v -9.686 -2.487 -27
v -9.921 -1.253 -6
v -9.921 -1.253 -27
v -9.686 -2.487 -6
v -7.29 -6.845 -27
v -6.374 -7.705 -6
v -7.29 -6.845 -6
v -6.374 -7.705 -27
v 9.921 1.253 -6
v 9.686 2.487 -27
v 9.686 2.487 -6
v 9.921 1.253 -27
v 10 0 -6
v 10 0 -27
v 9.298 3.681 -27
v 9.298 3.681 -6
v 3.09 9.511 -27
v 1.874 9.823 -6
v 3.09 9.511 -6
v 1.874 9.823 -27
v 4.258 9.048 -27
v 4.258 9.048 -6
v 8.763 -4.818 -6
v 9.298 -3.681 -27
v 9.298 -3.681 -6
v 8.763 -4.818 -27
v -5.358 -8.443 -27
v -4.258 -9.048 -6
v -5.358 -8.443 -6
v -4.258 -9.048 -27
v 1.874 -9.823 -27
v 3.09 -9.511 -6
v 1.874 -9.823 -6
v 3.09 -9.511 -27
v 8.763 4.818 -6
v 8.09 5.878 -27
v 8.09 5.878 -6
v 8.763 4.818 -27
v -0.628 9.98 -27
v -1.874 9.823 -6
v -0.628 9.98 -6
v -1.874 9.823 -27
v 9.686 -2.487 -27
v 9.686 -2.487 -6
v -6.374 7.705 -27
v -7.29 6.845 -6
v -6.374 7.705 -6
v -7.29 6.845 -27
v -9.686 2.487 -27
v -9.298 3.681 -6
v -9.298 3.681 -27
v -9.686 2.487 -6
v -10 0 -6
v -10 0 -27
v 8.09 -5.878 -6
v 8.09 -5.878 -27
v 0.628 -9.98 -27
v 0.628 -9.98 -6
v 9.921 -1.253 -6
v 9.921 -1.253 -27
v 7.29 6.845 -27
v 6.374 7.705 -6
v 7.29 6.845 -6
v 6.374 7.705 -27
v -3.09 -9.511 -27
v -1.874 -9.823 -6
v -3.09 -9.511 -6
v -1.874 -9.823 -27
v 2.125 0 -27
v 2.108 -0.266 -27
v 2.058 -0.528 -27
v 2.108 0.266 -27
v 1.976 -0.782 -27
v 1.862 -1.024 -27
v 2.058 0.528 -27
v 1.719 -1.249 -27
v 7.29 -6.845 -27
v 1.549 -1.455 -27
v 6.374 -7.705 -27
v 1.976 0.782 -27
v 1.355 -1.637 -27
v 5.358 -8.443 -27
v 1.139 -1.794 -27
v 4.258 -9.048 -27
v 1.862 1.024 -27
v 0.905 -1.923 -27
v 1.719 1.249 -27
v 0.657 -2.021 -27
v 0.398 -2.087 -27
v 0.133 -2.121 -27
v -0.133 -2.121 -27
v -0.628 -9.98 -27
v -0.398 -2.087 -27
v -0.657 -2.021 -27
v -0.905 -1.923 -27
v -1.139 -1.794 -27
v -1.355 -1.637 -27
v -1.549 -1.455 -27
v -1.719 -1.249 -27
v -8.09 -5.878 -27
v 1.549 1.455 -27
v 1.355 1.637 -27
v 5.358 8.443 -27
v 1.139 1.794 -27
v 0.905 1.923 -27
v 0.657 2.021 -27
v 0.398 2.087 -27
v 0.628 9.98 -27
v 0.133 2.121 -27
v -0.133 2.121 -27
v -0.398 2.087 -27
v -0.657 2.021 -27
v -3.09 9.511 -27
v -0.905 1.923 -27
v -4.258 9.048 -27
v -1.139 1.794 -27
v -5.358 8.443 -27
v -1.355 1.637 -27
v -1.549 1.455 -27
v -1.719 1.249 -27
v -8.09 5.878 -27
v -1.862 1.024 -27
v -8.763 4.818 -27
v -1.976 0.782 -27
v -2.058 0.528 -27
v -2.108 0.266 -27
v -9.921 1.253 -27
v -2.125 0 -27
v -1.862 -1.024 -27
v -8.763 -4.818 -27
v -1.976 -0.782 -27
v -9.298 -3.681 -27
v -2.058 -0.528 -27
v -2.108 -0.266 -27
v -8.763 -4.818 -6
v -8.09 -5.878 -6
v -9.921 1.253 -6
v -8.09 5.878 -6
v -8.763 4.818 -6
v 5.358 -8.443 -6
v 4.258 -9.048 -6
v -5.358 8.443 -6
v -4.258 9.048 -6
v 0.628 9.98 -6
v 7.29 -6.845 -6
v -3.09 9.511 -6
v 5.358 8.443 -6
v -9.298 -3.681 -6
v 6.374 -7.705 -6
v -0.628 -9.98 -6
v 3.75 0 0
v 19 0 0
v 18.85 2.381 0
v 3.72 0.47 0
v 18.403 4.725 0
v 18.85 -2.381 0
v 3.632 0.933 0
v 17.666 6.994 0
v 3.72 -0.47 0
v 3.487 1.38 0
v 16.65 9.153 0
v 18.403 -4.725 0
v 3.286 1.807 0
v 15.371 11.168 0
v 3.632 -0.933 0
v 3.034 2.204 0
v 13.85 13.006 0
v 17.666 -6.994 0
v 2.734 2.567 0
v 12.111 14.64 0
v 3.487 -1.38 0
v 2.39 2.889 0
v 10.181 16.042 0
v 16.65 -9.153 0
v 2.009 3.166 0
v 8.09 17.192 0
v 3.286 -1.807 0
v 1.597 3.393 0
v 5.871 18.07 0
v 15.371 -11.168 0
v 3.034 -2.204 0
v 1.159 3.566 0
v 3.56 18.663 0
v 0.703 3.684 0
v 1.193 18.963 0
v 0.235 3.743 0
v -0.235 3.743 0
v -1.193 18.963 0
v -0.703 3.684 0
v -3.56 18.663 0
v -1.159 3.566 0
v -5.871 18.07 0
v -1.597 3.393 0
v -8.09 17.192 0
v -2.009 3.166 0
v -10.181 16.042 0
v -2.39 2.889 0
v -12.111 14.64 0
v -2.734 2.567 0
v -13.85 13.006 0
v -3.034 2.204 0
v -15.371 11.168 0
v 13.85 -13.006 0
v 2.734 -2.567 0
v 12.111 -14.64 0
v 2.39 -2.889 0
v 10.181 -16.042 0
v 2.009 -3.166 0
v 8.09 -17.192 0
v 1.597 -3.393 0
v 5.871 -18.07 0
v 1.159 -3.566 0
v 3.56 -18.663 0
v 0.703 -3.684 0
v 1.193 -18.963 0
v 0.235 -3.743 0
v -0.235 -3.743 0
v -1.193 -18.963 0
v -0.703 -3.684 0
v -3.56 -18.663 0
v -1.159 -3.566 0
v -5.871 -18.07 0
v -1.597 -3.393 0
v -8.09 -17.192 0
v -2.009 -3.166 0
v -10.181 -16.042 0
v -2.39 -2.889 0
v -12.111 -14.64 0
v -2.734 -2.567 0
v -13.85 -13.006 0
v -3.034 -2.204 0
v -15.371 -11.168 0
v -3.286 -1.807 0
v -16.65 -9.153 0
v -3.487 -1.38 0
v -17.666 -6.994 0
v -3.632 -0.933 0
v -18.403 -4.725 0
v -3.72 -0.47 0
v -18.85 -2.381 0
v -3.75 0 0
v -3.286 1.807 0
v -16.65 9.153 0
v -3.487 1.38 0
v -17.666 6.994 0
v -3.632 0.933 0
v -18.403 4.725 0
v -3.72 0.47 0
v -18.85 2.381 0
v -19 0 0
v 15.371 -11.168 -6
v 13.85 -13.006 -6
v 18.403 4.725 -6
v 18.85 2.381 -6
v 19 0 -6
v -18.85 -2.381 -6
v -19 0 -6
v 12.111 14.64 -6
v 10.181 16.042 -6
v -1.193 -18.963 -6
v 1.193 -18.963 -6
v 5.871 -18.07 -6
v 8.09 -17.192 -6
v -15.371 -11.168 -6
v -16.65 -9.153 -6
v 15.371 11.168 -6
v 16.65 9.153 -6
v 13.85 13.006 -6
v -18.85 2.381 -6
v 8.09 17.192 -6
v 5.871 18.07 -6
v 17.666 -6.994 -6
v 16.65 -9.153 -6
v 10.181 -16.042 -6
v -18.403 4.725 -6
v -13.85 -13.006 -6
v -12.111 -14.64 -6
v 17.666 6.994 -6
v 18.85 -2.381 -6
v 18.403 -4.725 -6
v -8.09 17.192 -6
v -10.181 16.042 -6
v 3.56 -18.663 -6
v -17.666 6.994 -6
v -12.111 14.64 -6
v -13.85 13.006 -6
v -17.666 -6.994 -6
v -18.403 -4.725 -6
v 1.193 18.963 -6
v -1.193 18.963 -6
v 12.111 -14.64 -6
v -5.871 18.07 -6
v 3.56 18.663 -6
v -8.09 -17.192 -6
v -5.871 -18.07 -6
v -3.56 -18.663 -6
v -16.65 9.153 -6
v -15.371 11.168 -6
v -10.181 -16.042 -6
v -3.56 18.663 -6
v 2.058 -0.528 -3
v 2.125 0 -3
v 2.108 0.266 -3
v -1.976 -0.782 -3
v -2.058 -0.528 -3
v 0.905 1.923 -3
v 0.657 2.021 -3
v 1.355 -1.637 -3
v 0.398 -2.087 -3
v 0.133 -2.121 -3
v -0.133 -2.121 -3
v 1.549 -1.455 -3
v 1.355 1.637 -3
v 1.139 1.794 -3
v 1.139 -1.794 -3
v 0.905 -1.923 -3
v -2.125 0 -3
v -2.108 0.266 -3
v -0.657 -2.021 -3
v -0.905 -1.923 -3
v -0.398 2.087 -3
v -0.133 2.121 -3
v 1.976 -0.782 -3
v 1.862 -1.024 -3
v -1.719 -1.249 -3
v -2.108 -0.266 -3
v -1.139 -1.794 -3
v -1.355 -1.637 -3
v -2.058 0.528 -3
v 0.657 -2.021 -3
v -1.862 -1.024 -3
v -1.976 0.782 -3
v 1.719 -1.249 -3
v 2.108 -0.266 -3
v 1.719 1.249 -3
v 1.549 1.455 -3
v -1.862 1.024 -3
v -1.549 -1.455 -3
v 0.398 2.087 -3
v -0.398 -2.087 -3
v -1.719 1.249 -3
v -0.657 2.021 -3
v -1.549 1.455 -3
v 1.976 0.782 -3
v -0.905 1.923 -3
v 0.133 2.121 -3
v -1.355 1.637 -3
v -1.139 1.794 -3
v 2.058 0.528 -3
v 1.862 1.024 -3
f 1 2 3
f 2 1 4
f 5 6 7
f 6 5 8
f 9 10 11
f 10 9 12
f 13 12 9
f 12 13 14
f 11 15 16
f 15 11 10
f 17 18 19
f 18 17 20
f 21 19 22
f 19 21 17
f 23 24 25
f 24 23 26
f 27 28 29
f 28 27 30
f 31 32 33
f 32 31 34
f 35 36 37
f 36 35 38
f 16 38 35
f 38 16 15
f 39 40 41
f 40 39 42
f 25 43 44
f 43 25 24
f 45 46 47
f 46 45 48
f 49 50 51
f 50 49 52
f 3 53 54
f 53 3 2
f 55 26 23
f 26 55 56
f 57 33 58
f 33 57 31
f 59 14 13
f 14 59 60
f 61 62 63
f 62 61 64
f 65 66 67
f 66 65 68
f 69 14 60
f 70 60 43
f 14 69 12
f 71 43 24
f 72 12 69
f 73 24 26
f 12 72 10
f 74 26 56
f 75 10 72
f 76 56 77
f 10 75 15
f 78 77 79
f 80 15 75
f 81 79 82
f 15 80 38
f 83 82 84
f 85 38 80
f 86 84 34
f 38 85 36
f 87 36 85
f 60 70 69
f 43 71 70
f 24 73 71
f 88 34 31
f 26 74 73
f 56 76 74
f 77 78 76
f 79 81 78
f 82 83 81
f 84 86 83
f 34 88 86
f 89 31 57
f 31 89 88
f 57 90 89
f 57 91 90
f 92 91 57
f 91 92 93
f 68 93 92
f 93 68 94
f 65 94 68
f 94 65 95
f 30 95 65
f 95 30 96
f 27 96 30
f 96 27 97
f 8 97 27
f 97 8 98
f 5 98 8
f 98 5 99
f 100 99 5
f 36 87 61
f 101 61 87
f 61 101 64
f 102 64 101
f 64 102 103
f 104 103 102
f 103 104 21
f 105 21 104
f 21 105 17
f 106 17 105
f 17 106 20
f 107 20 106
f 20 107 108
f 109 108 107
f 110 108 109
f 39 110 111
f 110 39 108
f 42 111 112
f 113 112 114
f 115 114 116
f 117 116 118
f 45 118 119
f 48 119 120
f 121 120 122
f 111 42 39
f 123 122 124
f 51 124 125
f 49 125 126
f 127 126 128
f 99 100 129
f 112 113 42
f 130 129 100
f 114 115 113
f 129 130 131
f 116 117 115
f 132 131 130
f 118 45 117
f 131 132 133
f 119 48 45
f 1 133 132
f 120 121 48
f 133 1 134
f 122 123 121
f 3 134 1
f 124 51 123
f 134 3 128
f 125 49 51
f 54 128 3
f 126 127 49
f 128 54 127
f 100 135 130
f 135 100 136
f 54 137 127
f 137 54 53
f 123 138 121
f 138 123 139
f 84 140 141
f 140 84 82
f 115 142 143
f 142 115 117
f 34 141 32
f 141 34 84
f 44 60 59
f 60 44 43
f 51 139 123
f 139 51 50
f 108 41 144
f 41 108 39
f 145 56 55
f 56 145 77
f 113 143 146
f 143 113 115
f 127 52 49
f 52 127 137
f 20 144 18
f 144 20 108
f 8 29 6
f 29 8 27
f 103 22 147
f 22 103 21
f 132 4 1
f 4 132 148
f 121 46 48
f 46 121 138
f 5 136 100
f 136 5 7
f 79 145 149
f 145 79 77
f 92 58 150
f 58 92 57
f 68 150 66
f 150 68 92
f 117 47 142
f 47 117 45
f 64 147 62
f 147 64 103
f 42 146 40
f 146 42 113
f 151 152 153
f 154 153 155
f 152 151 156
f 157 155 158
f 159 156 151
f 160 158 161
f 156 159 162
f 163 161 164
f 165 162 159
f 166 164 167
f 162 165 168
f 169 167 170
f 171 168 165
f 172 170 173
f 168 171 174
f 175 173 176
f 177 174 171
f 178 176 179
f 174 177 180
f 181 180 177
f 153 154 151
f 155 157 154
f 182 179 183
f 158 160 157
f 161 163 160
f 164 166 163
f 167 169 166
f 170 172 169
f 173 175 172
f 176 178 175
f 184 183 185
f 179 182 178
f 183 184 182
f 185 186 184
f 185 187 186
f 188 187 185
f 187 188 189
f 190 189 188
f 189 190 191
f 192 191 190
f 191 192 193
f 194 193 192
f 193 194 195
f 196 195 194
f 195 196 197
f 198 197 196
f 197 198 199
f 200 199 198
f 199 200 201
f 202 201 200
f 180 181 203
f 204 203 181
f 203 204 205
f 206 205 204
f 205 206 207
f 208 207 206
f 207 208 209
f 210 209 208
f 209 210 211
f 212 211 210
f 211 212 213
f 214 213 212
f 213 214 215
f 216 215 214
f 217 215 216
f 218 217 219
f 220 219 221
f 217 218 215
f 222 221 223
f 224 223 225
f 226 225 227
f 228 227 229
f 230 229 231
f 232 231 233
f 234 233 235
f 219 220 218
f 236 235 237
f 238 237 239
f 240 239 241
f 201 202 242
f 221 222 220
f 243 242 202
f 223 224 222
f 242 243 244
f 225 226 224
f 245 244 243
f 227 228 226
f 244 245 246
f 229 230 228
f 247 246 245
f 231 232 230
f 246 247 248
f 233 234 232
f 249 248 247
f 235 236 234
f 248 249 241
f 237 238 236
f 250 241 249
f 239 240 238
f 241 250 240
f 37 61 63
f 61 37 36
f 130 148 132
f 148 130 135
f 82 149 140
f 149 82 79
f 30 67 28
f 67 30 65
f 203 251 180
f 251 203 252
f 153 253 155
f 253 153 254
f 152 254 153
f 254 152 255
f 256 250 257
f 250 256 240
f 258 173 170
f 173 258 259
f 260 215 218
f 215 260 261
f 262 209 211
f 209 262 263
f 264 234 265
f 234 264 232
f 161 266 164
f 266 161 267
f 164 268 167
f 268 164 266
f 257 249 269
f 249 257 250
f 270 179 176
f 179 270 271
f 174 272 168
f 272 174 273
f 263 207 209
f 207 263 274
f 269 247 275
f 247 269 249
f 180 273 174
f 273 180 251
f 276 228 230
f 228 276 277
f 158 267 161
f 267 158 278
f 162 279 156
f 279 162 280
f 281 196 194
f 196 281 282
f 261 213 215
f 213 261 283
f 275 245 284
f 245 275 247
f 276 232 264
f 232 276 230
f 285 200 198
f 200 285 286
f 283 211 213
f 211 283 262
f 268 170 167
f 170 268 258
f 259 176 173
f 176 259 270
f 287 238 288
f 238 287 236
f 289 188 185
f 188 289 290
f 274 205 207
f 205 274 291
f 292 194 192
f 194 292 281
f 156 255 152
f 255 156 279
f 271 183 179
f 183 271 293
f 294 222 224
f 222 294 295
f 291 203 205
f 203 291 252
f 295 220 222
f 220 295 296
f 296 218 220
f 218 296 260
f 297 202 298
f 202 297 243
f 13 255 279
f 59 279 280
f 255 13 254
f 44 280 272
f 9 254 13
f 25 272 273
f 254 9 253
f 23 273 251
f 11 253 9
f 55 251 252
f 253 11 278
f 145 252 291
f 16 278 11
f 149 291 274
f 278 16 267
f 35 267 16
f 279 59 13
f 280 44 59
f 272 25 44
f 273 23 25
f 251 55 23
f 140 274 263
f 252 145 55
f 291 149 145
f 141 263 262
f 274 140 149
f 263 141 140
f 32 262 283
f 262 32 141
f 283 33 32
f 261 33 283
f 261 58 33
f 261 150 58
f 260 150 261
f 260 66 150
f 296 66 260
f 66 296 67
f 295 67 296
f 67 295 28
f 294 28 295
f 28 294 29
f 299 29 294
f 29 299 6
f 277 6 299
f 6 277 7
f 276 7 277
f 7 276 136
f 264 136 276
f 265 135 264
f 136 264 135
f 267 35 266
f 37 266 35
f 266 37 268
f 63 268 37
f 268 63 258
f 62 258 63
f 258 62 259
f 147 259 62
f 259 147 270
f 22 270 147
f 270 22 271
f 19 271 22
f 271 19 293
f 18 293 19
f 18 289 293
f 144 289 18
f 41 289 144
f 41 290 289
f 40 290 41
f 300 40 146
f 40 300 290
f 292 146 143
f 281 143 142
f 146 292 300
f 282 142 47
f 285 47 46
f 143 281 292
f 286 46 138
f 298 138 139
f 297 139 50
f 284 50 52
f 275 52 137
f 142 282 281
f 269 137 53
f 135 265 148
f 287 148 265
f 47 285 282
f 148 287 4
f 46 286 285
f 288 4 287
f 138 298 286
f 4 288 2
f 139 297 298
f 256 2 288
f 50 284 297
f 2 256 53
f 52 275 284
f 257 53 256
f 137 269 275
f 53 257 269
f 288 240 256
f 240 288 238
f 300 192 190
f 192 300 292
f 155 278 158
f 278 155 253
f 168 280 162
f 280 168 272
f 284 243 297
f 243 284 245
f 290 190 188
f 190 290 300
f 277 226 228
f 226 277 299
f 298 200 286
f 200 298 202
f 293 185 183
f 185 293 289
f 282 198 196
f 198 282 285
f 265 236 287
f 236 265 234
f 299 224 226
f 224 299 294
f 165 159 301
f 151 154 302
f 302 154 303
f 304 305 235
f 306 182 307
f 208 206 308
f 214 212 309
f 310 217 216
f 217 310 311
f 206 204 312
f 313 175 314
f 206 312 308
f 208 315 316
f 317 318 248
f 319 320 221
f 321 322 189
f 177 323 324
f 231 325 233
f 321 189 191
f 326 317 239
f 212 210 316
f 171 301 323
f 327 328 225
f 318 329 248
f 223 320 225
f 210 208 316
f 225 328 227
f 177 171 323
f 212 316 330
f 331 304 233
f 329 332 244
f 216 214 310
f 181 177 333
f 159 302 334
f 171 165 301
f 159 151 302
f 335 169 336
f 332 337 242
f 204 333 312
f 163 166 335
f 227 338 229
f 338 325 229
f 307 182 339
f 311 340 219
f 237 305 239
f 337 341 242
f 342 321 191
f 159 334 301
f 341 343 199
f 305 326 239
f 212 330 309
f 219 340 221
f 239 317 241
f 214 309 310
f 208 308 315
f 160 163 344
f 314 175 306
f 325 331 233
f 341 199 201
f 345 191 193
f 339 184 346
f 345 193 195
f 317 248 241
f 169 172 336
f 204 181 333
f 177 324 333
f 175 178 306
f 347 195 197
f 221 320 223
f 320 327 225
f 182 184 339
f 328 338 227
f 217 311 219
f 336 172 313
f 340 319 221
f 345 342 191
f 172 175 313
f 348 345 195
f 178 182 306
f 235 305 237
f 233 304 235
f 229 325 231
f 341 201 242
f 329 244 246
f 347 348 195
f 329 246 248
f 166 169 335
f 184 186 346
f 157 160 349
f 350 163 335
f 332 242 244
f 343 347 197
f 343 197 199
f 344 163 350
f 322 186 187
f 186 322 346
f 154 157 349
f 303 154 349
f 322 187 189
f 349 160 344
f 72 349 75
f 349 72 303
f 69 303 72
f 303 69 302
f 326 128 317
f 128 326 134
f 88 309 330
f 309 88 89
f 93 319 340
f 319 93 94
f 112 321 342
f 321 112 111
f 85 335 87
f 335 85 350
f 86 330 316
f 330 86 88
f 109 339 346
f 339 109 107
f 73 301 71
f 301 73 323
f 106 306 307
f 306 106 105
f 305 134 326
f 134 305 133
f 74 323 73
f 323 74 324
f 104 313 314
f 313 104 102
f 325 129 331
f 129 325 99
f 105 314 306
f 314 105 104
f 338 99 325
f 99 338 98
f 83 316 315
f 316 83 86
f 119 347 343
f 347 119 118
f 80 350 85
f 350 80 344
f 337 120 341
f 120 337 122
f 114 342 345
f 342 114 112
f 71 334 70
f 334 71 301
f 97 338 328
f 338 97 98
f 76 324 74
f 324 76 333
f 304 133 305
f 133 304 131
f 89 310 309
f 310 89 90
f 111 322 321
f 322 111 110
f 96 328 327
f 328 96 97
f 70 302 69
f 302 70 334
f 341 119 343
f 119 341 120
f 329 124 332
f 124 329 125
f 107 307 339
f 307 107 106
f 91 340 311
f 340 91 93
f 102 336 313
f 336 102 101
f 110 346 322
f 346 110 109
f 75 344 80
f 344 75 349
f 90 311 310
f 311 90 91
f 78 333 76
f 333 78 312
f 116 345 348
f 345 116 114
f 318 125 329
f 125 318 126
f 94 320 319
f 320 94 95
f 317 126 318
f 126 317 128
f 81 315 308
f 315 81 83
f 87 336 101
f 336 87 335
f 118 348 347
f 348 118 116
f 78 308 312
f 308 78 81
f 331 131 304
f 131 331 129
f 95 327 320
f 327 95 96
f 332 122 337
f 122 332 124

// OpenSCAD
$fn = 50;


difference() {
	union() {
		translate(v = [0, 0, -27.0000000000]) {
			cylinder(h = 27, r = 10.0000000000);
		}
		translate(v = [0, 0, -6.0000000000]) {
			cylinder(h = 6, r = 19.0000000000);
		}
	}
	union() {
		translate(v = [0, 0, 0]) {
			rotate(a = [0, 0, 0]) {
				difference() {
					union() {
						#translate(v = [0, 0, -27.0000000000]) {
							cylinder(h = 27, r = 2.0000000000);
						}
						#translate(v = [0, 0, -3]) {
							cylinder(h = 3, r = 10.0000000000, r1 = 2.1250000000, r2 = 3.7500000000);
						}
						#translate(v = [0, 0, -27.0000000000]) {
							cylinder(h = 27, r = 2.1250000000);
						}
						#translate(v = [0, 0, -27.0000000000]) {
							cylinder(h = 27, r = 2.0000000000);
						}
					}
					union();
				}
			}
		}
	}
}
